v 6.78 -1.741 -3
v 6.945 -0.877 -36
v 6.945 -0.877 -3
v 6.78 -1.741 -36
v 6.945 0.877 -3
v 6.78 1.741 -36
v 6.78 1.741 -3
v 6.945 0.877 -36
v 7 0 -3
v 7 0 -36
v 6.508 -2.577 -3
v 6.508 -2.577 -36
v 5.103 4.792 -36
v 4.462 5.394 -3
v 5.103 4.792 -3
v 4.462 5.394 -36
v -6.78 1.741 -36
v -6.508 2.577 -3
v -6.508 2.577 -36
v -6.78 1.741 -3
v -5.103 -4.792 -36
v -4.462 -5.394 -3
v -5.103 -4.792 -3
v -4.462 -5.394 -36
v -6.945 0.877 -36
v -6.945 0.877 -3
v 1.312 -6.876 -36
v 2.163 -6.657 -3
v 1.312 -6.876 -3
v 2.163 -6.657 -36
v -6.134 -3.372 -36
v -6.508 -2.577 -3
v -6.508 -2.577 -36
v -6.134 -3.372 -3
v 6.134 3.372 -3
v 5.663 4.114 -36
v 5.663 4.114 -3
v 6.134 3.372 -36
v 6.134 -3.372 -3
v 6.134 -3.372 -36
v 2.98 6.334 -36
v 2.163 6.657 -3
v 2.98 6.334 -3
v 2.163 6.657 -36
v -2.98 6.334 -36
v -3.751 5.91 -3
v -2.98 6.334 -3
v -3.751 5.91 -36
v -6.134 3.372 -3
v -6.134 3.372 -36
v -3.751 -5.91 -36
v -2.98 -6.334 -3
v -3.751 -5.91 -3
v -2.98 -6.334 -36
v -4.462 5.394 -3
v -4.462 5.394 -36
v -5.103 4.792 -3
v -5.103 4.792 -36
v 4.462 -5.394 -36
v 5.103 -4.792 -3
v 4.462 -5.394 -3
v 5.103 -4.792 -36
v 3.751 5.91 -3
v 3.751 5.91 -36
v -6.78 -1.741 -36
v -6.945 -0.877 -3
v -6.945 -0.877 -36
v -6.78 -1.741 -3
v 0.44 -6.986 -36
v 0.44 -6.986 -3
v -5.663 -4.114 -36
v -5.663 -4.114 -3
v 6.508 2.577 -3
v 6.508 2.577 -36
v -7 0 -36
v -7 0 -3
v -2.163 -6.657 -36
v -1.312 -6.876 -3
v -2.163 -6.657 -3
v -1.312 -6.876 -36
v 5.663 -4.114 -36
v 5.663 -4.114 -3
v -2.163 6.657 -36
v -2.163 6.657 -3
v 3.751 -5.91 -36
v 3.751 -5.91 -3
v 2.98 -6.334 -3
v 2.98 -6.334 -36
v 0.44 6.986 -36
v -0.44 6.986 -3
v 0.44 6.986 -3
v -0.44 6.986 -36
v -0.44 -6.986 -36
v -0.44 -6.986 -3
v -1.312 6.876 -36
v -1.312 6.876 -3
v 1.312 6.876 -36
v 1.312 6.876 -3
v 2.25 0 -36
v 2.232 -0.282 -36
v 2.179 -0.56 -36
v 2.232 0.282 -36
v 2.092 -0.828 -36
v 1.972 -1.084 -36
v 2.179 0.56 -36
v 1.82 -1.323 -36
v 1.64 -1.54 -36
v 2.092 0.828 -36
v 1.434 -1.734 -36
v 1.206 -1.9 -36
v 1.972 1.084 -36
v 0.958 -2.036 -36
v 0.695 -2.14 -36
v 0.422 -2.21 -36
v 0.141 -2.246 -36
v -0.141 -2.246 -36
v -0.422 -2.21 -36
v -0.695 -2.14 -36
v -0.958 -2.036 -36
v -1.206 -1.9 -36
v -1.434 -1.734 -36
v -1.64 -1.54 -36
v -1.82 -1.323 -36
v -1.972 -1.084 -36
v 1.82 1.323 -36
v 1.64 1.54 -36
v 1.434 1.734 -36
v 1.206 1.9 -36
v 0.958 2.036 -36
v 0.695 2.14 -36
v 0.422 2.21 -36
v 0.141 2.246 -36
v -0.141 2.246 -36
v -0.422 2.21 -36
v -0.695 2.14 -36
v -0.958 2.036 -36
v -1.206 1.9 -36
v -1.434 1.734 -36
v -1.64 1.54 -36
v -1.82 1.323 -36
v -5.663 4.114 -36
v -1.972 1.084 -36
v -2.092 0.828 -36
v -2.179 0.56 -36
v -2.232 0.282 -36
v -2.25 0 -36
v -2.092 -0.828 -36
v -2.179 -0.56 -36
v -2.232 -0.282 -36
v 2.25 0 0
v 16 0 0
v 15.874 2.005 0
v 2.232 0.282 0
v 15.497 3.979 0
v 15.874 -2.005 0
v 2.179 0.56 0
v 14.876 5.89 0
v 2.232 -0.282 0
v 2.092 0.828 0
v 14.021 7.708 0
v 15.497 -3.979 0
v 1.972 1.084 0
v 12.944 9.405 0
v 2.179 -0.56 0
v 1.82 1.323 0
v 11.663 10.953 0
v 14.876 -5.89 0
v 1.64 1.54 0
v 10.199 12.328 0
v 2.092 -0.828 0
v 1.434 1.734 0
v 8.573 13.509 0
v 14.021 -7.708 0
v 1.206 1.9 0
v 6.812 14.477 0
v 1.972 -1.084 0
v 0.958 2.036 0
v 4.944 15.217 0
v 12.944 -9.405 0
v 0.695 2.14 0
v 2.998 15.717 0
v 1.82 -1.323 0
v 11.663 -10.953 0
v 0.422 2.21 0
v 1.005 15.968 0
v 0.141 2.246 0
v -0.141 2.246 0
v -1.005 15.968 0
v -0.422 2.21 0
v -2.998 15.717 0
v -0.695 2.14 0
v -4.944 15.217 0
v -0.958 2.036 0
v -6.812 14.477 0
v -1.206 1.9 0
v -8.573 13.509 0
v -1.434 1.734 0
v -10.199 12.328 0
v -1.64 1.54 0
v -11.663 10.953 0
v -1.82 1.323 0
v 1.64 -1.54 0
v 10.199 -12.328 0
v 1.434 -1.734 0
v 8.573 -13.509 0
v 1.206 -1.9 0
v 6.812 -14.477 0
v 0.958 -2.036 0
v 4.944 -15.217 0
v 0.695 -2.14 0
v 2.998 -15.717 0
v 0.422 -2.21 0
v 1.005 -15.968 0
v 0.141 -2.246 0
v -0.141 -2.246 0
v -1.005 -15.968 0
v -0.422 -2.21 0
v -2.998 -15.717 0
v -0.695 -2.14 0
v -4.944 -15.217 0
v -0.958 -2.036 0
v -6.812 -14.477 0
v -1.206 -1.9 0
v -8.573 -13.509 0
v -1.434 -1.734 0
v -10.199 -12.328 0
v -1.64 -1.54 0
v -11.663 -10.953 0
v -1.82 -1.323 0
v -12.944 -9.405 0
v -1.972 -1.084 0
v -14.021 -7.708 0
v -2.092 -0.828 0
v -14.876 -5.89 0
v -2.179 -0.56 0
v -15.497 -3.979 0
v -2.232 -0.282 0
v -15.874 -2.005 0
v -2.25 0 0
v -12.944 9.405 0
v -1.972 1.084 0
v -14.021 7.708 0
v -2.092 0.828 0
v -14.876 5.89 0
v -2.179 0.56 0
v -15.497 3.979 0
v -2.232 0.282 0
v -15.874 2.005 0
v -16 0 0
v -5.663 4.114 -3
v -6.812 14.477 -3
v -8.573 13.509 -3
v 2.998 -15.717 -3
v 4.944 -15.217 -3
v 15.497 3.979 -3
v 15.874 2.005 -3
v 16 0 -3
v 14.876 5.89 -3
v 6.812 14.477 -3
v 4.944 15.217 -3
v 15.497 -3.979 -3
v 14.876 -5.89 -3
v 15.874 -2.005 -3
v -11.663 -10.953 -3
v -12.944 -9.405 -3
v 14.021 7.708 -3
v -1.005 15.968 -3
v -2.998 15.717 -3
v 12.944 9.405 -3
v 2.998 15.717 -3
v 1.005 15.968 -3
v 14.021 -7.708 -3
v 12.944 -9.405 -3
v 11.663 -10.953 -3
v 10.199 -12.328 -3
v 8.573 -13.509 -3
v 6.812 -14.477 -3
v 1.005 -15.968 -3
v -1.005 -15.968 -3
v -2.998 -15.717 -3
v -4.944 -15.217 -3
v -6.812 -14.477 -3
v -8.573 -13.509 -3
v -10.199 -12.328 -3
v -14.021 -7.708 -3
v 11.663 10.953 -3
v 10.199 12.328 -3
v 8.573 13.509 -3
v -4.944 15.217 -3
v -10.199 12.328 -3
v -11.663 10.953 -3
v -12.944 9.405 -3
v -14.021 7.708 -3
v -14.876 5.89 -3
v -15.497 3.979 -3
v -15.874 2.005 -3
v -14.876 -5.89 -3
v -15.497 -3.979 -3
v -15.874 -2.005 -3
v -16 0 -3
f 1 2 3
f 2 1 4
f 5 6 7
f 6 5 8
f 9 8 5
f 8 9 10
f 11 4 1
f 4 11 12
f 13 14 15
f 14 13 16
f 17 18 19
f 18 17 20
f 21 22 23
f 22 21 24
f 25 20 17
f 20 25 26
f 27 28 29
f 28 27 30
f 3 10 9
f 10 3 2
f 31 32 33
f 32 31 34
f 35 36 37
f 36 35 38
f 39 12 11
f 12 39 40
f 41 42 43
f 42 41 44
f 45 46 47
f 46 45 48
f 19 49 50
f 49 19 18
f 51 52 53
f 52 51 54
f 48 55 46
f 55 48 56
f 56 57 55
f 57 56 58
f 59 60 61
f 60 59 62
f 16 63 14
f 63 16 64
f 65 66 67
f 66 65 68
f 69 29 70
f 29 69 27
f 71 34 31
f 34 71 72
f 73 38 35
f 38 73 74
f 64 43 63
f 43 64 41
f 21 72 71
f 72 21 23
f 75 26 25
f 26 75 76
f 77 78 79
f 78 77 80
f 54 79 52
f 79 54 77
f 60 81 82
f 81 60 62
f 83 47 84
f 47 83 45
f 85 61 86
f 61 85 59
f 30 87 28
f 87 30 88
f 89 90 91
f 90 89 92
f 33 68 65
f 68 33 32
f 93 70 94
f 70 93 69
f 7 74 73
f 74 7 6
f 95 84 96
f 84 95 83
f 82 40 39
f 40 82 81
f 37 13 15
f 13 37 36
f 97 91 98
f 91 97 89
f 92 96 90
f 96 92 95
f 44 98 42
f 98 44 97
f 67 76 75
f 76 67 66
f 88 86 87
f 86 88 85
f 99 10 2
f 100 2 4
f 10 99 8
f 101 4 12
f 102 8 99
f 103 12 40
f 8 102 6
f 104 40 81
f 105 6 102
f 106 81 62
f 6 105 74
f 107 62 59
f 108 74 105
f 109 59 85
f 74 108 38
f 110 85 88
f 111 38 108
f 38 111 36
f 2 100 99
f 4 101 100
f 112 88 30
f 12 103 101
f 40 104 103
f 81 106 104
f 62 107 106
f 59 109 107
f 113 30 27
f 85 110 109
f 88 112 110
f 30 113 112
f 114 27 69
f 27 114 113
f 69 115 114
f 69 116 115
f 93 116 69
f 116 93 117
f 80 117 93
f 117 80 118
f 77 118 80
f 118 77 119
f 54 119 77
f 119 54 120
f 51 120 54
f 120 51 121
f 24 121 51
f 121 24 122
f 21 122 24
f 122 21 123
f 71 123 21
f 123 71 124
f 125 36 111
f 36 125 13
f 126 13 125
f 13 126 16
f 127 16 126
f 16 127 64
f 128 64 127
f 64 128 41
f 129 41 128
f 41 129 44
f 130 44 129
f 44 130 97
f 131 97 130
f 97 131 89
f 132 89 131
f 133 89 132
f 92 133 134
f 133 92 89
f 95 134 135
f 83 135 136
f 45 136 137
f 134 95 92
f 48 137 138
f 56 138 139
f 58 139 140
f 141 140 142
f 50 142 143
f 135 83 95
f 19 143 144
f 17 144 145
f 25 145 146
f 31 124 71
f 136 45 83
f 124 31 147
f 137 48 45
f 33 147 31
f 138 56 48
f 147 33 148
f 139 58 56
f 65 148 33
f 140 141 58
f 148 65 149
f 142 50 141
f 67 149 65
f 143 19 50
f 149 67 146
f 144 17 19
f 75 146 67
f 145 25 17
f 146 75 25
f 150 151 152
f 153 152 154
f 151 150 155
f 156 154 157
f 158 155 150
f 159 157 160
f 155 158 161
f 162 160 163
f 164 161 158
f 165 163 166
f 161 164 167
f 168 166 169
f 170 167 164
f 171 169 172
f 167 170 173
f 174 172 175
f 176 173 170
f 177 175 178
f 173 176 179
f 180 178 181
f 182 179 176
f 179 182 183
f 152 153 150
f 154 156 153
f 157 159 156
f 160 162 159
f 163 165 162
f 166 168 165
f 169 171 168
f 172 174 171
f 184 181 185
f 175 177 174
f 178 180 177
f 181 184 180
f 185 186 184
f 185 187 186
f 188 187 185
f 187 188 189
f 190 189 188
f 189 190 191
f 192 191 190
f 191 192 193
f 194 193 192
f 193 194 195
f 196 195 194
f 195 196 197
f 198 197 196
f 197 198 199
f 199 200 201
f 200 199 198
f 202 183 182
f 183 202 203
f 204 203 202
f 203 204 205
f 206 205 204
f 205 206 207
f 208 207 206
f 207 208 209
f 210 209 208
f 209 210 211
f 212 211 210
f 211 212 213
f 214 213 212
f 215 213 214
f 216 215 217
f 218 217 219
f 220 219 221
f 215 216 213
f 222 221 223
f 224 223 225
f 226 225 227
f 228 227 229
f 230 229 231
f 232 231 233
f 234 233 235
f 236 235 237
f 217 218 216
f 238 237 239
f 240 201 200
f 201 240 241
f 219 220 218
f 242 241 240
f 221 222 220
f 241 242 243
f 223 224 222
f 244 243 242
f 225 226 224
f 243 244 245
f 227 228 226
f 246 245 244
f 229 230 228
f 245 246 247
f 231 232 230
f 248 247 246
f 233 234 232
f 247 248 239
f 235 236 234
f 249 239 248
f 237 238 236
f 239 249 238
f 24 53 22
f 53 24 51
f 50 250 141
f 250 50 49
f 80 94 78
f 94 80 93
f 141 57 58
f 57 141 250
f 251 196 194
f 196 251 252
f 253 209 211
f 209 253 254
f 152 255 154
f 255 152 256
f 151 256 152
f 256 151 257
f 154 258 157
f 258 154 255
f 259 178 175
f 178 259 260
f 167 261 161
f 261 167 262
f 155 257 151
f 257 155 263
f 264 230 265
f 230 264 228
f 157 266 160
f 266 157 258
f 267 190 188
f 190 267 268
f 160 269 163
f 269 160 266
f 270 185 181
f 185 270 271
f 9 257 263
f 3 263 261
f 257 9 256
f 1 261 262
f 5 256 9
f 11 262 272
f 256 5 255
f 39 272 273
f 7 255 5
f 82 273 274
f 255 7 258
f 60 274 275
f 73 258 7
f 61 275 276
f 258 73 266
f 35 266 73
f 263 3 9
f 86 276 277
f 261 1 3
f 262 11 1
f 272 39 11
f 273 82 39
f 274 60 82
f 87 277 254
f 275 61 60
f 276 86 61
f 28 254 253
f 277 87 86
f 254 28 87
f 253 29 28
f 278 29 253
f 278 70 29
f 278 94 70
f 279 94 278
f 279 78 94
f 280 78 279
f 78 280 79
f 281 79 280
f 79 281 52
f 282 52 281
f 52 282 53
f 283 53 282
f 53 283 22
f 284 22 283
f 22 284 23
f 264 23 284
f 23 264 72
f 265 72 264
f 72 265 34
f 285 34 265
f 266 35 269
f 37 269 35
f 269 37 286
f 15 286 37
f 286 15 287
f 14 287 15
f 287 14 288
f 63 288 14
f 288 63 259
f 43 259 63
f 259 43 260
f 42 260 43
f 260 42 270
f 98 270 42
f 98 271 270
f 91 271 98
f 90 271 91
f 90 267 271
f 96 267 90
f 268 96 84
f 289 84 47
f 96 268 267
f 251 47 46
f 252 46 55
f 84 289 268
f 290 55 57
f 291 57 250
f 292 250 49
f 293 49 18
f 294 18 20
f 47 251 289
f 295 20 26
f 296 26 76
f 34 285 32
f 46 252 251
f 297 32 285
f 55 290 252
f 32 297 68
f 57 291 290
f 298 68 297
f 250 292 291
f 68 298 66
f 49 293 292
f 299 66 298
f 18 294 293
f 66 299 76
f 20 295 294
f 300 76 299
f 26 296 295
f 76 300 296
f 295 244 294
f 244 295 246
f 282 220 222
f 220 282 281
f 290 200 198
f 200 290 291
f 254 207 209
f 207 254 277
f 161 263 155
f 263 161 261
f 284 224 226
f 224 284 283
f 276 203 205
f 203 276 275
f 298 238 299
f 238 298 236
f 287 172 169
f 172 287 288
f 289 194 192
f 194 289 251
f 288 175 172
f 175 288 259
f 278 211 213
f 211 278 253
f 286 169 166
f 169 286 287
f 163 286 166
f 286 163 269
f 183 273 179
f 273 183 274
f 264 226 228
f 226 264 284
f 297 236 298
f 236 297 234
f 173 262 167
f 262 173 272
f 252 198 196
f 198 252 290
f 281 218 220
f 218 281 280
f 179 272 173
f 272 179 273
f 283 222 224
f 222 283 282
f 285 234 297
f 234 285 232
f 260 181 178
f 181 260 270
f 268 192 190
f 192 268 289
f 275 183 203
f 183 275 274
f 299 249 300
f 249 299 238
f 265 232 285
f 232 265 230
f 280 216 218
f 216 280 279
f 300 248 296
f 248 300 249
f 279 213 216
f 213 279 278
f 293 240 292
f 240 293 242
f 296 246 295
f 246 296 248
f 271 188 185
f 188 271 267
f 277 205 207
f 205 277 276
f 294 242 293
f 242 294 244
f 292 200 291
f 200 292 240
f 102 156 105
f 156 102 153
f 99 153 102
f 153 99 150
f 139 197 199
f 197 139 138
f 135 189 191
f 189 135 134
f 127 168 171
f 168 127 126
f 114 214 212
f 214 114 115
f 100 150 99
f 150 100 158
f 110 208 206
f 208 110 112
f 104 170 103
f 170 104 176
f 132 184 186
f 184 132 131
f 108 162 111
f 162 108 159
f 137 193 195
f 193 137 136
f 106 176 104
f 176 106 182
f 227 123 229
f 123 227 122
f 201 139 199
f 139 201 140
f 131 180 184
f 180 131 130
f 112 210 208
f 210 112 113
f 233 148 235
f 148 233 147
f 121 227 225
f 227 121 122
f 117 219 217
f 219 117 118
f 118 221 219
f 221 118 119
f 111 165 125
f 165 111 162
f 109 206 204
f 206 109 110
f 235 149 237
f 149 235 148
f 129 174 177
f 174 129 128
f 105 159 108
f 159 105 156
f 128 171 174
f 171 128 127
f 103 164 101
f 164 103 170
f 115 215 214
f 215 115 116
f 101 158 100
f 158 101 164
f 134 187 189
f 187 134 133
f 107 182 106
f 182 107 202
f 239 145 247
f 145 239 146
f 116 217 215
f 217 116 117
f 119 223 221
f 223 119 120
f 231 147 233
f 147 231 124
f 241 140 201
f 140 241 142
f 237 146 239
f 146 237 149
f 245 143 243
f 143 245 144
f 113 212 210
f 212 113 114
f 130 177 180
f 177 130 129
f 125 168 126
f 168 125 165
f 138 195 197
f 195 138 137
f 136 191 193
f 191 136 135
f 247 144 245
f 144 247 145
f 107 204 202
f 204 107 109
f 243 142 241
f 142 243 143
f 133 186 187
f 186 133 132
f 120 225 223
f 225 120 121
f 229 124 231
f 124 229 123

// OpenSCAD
$fn = 50;


difference() {
	union() {
		translate(v = [0, 0, -36.0000000000]) {
			cylinder(h = 36, r = 7.0000000000);
		}
		translate(v = [0, 0, -3.0000000000]) {
			cylinder(h = 3, r = 16.0000000000);
		}
	}
	union() {
		#translate(v = [0, 0, -36]) {
			cylinder(h = 36, r = 2.2500000000);
		}
	}
}
